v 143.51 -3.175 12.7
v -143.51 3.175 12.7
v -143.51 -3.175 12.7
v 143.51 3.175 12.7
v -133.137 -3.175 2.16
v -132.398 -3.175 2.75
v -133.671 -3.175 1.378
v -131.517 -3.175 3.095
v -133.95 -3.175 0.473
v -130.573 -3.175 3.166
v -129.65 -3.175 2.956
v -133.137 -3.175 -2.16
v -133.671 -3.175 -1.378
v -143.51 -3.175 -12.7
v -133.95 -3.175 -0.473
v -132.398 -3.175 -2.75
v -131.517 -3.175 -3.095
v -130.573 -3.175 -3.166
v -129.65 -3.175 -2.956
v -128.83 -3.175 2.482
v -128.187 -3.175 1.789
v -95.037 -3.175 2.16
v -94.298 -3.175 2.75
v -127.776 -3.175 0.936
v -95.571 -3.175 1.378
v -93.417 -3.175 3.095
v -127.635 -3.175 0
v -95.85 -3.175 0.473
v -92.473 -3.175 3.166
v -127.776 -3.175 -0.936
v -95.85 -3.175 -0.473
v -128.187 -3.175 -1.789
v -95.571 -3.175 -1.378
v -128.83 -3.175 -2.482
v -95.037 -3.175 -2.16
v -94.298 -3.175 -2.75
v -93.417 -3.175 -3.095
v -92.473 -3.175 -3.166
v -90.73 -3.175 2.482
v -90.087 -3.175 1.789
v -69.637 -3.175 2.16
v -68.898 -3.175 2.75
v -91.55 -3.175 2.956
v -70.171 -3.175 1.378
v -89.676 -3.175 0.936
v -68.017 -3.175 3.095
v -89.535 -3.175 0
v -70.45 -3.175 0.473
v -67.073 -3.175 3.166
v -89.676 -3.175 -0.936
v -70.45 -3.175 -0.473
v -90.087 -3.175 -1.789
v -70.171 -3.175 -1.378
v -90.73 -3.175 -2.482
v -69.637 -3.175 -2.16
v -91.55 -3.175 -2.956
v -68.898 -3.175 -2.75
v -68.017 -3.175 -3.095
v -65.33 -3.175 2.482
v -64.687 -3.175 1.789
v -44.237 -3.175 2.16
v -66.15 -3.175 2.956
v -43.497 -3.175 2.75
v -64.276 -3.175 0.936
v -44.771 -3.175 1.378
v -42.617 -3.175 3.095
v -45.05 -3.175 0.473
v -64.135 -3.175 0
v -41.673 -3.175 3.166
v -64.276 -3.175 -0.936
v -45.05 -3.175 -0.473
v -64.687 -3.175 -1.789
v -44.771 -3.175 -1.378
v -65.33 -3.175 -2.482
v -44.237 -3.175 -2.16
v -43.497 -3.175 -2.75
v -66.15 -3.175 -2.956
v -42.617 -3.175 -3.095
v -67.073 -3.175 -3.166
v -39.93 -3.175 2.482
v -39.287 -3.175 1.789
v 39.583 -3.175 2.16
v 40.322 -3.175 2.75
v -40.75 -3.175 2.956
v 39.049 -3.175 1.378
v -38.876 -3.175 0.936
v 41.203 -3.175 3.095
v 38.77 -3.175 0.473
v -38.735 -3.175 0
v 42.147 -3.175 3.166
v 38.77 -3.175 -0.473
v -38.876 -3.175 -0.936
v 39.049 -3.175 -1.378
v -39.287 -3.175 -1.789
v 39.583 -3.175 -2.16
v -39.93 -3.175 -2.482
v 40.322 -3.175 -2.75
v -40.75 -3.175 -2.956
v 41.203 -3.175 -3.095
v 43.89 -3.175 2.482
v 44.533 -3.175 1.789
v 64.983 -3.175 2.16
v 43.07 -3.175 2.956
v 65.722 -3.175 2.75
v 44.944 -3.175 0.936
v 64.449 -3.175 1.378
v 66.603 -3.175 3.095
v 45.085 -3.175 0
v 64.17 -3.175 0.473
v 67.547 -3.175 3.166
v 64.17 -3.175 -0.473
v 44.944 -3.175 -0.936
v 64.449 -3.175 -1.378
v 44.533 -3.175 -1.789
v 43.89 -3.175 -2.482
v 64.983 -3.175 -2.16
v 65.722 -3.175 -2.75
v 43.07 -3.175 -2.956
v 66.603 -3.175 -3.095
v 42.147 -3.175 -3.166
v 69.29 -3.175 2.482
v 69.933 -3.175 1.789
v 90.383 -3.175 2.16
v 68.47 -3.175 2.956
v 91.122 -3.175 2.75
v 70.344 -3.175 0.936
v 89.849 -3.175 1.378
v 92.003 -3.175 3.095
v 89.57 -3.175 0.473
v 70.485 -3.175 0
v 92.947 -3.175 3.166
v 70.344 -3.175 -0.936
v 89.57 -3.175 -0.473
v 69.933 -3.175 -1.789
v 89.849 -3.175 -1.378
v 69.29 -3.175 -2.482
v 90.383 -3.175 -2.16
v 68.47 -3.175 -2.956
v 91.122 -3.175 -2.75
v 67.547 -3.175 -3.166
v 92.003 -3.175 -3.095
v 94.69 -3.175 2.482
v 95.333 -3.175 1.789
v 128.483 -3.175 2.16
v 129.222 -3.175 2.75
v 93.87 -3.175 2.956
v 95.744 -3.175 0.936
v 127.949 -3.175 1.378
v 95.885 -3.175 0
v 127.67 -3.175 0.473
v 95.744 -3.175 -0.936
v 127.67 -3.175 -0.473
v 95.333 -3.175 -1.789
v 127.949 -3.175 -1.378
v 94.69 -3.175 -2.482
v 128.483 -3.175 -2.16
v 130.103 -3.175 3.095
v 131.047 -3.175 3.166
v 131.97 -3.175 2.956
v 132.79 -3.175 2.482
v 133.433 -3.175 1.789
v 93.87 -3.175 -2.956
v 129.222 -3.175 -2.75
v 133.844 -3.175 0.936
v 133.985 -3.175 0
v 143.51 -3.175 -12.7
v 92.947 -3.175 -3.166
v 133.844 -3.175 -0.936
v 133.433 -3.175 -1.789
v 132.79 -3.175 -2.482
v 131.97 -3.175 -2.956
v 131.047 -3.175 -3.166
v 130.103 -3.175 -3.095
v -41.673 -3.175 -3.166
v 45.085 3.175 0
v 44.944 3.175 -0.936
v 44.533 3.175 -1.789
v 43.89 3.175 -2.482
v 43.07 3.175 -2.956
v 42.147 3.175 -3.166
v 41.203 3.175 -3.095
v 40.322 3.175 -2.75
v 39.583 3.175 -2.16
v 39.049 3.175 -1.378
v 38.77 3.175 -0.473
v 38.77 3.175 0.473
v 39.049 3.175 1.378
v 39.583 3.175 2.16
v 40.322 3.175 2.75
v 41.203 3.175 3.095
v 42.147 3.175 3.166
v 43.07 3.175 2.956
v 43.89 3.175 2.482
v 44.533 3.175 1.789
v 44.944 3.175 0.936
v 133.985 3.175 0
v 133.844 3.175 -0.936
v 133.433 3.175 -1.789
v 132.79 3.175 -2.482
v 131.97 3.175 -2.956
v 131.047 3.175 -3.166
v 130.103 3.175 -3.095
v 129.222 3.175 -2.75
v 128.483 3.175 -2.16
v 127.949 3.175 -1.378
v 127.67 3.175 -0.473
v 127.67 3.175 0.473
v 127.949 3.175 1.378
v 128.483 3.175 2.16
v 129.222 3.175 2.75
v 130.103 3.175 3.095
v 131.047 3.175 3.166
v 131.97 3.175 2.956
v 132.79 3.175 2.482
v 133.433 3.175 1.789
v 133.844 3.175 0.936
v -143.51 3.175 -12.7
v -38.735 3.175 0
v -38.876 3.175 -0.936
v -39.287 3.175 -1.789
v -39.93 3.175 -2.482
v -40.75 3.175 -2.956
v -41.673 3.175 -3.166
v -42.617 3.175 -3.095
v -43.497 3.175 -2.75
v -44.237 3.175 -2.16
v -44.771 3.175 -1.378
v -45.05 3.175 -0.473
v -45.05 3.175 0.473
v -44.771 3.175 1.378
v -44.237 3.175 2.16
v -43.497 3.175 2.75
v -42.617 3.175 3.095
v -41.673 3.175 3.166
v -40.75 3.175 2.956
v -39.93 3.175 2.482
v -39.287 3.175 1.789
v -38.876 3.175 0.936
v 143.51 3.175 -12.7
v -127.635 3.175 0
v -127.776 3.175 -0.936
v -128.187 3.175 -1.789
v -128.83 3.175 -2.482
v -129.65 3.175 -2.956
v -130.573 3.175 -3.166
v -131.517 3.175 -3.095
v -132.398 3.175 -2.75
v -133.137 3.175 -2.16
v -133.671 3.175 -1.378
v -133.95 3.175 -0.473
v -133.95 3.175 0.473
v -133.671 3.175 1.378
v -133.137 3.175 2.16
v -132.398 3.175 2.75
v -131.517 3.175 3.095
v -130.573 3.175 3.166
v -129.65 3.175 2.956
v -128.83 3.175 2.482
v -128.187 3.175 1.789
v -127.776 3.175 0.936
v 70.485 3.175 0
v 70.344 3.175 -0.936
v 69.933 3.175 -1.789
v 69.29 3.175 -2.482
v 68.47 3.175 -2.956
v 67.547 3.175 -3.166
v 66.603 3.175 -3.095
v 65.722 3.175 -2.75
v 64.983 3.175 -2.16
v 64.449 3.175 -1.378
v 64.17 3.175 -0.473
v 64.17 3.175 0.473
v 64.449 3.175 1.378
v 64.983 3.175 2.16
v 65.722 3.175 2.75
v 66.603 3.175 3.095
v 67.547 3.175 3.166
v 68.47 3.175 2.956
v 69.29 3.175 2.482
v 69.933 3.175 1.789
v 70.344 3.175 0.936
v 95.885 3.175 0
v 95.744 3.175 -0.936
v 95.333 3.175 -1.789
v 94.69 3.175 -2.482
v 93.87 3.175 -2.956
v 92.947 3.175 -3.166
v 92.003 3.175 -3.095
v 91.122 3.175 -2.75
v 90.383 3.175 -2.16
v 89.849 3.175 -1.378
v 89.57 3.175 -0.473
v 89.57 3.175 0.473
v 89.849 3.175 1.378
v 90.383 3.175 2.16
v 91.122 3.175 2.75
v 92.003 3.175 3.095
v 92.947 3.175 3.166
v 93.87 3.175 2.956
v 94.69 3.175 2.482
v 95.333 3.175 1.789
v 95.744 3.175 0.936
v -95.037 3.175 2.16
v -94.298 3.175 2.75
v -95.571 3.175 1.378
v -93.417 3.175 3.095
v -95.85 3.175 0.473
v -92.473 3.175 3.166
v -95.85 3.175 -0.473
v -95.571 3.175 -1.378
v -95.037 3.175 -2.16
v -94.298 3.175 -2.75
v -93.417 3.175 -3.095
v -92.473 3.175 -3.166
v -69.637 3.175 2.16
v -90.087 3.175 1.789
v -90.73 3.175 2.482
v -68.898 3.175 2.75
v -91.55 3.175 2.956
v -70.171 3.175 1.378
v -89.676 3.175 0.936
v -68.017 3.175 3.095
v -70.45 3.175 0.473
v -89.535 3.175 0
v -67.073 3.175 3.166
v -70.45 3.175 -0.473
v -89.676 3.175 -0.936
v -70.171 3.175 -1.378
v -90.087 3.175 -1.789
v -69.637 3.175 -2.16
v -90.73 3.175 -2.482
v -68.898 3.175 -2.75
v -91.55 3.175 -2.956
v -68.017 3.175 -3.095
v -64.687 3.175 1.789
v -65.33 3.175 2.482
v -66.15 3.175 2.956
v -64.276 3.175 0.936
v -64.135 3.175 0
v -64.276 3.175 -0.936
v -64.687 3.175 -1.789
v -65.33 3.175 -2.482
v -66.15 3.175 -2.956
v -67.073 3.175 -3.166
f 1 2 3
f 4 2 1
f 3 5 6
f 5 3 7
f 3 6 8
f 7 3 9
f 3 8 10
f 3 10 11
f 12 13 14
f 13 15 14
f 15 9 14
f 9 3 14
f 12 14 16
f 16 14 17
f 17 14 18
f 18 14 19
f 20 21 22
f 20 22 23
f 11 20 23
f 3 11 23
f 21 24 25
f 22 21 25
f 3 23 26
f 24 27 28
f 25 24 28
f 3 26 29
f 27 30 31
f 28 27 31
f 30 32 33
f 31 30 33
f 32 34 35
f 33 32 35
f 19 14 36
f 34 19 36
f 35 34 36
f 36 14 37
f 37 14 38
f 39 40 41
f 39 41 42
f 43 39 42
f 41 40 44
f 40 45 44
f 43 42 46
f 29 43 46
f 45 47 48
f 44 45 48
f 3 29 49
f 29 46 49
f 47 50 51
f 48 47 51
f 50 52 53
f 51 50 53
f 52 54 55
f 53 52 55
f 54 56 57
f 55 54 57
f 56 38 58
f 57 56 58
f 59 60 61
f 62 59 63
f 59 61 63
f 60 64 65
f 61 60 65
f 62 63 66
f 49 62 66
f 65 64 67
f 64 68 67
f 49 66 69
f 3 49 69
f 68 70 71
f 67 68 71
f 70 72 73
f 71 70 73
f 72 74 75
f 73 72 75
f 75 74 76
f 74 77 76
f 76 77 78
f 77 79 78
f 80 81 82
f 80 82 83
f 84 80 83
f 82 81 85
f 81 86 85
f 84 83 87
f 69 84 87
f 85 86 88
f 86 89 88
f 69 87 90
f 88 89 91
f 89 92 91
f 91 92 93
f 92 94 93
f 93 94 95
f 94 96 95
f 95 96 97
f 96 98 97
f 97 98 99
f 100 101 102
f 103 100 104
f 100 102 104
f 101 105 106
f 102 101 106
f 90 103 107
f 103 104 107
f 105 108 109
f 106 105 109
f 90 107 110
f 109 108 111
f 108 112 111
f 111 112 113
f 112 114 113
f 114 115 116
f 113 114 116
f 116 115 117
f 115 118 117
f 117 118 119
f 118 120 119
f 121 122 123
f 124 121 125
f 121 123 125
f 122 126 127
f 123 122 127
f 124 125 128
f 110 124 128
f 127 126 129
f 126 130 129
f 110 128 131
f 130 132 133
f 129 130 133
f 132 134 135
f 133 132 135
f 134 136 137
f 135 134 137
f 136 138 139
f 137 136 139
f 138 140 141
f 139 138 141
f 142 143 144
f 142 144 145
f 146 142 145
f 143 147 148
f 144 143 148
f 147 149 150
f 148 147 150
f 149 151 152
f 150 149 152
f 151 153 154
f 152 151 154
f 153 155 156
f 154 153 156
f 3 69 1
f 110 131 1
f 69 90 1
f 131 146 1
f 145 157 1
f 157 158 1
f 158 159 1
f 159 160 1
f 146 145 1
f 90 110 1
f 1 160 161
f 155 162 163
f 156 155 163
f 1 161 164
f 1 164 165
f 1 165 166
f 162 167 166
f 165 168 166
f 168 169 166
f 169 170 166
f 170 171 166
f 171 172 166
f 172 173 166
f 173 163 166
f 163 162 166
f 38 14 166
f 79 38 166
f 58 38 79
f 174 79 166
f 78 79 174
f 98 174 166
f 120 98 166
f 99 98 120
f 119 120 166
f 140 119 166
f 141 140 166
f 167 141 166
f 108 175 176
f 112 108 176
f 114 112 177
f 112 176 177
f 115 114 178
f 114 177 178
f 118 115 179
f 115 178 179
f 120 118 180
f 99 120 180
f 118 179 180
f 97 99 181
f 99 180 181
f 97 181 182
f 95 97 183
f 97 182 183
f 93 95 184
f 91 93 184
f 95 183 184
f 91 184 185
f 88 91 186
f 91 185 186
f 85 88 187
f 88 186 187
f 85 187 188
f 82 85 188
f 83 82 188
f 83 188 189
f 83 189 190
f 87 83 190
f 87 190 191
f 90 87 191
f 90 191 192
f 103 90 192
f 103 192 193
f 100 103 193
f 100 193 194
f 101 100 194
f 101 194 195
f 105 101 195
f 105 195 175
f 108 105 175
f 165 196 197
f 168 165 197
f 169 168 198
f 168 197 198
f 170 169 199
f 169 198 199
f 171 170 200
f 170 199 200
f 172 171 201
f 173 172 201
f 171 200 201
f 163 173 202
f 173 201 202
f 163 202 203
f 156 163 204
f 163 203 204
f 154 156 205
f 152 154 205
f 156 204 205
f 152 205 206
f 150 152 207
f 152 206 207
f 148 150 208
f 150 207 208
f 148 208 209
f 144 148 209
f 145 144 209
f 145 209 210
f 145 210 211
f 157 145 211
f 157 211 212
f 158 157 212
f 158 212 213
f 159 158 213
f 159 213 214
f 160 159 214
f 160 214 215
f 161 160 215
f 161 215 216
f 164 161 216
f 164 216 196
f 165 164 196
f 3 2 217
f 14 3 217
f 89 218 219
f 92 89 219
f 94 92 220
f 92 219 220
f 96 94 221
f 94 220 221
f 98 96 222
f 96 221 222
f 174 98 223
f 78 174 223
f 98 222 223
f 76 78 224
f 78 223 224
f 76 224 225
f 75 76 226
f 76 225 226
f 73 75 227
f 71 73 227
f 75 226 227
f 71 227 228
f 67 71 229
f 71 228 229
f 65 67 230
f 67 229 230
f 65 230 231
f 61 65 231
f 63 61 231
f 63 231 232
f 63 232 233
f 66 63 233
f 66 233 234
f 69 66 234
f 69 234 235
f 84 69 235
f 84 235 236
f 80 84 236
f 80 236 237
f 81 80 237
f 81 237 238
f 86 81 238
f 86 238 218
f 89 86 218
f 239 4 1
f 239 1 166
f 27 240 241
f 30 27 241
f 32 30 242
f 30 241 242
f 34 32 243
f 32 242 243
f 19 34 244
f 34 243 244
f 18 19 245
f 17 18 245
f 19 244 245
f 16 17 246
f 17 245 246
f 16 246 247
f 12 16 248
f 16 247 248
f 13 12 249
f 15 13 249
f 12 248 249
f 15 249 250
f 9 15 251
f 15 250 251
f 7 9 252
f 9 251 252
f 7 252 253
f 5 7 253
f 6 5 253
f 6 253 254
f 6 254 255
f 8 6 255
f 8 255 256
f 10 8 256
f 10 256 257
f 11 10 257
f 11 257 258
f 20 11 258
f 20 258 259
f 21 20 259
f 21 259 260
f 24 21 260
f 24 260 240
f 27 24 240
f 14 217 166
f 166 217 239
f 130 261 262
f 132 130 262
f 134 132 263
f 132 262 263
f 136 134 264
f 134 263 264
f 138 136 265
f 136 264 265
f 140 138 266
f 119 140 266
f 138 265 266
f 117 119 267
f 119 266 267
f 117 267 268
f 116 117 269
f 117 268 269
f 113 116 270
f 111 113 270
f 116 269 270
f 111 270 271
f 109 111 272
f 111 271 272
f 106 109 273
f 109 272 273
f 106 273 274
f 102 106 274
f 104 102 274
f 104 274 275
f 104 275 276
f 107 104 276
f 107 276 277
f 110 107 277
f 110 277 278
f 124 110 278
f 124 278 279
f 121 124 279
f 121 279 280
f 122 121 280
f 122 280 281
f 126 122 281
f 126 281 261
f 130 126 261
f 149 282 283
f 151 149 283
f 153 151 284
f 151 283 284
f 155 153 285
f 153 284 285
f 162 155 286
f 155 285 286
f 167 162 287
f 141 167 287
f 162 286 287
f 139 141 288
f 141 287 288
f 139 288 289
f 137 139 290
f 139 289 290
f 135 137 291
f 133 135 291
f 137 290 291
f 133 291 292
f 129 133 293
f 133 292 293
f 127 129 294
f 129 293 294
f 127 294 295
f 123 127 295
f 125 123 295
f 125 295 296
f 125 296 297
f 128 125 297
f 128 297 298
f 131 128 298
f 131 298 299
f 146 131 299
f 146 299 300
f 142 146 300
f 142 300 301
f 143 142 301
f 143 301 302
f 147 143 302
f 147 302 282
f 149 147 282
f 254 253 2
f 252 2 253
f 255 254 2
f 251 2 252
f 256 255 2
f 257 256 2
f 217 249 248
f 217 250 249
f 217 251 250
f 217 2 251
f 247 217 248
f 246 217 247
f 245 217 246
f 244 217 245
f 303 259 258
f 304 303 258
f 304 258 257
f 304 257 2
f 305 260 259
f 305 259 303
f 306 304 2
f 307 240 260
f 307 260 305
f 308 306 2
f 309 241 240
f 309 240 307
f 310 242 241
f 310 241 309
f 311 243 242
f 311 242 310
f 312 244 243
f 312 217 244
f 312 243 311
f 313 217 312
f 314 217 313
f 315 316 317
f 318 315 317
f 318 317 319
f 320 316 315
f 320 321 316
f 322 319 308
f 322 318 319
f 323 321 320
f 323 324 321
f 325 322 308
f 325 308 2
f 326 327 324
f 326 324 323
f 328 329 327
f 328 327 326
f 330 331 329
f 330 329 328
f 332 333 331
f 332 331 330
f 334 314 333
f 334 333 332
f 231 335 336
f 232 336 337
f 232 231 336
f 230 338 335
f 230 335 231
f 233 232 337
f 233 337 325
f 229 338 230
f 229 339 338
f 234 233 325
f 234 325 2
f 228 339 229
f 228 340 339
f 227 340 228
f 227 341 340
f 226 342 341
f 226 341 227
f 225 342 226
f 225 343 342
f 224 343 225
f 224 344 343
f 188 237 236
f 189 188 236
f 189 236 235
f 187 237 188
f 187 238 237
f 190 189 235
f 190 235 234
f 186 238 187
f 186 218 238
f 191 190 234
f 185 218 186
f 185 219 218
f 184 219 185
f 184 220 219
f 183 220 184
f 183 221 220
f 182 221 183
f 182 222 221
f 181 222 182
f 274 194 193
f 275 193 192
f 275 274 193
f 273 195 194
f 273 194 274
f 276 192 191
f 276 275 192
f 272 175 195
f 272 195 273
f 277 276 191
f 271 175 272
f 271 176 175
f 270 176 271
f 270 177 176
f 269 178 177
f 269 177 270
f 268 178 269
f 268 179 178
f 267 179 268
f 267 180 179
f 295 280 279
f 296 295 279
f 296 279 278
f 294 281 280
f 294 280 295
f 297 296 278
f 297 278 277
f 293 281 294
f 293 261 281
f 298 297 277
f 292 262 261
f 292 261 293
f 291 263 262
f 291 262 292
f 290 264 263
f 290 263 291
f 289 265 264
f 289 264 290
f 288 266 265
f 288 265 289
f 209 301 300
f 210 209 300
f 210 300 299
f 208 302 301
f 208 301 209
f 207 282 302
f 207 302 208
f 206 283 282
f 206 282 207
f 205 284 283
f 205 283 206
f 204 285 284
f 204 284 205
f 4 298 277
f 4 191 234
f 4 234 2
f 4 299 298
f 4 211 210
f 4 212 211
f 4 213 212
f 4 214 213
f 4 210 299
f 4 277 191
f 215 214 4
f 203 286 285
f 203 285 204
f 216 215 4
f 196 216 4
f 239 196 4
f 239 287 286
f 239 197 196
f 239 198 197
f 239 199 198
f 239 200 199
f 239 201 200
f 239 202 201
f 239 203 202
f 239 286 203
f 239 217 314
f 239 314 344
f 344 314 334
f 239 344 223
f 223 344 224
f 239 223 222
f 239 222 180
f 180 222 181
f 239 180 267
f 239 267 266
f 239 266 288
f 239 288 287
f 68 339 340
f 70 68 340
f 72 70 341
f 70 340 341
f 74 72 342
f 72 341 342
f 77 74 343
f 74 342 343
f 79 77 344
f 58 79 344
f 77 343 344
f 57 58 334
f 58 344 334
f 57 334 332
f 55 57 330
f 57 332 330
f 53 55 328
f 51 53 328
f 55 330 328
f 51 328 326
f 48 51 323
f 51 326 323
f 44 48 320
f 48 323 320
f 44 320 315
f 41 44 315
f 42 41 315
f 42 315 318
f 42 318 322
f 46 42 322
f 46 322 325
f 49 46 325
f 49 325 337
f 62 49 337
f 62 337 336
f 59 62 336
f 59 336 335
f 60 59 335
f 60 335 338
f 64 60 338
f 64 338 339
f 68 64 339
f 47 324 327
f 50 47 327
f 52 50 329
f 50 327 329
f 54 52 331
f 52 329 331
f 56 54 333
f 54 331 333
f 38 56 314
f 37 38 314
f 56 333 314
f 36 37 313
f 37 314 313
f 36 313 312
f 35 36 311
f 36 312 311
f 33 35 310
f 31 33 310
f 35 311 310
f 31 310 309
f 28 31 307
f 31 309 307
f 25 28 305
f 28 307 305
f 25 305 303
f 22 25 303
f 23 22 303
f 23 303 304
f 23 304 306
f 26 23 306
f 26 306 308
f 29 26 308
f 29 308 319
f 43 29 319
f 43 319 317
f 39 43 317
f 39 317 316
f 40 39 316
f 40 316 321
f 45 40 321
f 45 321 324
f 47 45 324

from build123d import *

# Parameters (mm, degrees)
SKETCH1_W               = 287.02
SKETCH1_H               = 25.4
BOSS_EXTRUDE1_DEPTH     = 3.175
SKETCH2_R               = 3.175
CUT_EXTRUDE1_DEPTH      = 1
CUT_EXTRUDE1_DEPTH_BACK = 7.35


with BuildPart() as part:
    # Sketch1 → Boss-Extrude1 (new body, symmetric)
    with BuildSketch(Plane(origin=(0, 0, 0), x_dir=(1, 0, 0), z_dir=(0, 1, 0))):
        Rectangle(SKETCH1_W, SKETCH1_H)
    extrude(amount=BOSS_EXTRUDE1_DEPTH, both=True)

    # Sketch2 → Cut-Extrude1 (cut, two sides)
    with BuildSketch(Plane(origin=(0, 3.175, 0), x_dir=(1, 0, 0), z_dir=(0, 1, 0))) as cut_extrude1_sk:
        with Locations((-130.81, 0)):
            Circle(SKETCH2_R)
        with Locations((-41.91, 0)):
            Circle(SKETCH2_R)
        with Locations((130.81, 0)):
            Circle(SKETCH2_R)
        with Locations((41.91, 0)):
            Circle(SKETCH2_R)
        with Locations((-92.71, 0)):
            Circle(SKETCH2_R)
        with Locations((-67.31, 0)):
            Circle(SKETCH2_R)
        with Locations((67.31, 0)):
            Circle(SKETCH2_R)
        with Locations((92.71, 0)):
            Circle(SKETCH2_R)
    extrude(amount=CUT_EXTRUDE1_DEPTH, mode=Mode.SUBTRACT)
    extrude(cut_extrude1_sk.sketch, amount=-CUT_EXTRUDE1_DEPTH_BACK, mode=Mode.SUBTRACT)


solid = part.part
